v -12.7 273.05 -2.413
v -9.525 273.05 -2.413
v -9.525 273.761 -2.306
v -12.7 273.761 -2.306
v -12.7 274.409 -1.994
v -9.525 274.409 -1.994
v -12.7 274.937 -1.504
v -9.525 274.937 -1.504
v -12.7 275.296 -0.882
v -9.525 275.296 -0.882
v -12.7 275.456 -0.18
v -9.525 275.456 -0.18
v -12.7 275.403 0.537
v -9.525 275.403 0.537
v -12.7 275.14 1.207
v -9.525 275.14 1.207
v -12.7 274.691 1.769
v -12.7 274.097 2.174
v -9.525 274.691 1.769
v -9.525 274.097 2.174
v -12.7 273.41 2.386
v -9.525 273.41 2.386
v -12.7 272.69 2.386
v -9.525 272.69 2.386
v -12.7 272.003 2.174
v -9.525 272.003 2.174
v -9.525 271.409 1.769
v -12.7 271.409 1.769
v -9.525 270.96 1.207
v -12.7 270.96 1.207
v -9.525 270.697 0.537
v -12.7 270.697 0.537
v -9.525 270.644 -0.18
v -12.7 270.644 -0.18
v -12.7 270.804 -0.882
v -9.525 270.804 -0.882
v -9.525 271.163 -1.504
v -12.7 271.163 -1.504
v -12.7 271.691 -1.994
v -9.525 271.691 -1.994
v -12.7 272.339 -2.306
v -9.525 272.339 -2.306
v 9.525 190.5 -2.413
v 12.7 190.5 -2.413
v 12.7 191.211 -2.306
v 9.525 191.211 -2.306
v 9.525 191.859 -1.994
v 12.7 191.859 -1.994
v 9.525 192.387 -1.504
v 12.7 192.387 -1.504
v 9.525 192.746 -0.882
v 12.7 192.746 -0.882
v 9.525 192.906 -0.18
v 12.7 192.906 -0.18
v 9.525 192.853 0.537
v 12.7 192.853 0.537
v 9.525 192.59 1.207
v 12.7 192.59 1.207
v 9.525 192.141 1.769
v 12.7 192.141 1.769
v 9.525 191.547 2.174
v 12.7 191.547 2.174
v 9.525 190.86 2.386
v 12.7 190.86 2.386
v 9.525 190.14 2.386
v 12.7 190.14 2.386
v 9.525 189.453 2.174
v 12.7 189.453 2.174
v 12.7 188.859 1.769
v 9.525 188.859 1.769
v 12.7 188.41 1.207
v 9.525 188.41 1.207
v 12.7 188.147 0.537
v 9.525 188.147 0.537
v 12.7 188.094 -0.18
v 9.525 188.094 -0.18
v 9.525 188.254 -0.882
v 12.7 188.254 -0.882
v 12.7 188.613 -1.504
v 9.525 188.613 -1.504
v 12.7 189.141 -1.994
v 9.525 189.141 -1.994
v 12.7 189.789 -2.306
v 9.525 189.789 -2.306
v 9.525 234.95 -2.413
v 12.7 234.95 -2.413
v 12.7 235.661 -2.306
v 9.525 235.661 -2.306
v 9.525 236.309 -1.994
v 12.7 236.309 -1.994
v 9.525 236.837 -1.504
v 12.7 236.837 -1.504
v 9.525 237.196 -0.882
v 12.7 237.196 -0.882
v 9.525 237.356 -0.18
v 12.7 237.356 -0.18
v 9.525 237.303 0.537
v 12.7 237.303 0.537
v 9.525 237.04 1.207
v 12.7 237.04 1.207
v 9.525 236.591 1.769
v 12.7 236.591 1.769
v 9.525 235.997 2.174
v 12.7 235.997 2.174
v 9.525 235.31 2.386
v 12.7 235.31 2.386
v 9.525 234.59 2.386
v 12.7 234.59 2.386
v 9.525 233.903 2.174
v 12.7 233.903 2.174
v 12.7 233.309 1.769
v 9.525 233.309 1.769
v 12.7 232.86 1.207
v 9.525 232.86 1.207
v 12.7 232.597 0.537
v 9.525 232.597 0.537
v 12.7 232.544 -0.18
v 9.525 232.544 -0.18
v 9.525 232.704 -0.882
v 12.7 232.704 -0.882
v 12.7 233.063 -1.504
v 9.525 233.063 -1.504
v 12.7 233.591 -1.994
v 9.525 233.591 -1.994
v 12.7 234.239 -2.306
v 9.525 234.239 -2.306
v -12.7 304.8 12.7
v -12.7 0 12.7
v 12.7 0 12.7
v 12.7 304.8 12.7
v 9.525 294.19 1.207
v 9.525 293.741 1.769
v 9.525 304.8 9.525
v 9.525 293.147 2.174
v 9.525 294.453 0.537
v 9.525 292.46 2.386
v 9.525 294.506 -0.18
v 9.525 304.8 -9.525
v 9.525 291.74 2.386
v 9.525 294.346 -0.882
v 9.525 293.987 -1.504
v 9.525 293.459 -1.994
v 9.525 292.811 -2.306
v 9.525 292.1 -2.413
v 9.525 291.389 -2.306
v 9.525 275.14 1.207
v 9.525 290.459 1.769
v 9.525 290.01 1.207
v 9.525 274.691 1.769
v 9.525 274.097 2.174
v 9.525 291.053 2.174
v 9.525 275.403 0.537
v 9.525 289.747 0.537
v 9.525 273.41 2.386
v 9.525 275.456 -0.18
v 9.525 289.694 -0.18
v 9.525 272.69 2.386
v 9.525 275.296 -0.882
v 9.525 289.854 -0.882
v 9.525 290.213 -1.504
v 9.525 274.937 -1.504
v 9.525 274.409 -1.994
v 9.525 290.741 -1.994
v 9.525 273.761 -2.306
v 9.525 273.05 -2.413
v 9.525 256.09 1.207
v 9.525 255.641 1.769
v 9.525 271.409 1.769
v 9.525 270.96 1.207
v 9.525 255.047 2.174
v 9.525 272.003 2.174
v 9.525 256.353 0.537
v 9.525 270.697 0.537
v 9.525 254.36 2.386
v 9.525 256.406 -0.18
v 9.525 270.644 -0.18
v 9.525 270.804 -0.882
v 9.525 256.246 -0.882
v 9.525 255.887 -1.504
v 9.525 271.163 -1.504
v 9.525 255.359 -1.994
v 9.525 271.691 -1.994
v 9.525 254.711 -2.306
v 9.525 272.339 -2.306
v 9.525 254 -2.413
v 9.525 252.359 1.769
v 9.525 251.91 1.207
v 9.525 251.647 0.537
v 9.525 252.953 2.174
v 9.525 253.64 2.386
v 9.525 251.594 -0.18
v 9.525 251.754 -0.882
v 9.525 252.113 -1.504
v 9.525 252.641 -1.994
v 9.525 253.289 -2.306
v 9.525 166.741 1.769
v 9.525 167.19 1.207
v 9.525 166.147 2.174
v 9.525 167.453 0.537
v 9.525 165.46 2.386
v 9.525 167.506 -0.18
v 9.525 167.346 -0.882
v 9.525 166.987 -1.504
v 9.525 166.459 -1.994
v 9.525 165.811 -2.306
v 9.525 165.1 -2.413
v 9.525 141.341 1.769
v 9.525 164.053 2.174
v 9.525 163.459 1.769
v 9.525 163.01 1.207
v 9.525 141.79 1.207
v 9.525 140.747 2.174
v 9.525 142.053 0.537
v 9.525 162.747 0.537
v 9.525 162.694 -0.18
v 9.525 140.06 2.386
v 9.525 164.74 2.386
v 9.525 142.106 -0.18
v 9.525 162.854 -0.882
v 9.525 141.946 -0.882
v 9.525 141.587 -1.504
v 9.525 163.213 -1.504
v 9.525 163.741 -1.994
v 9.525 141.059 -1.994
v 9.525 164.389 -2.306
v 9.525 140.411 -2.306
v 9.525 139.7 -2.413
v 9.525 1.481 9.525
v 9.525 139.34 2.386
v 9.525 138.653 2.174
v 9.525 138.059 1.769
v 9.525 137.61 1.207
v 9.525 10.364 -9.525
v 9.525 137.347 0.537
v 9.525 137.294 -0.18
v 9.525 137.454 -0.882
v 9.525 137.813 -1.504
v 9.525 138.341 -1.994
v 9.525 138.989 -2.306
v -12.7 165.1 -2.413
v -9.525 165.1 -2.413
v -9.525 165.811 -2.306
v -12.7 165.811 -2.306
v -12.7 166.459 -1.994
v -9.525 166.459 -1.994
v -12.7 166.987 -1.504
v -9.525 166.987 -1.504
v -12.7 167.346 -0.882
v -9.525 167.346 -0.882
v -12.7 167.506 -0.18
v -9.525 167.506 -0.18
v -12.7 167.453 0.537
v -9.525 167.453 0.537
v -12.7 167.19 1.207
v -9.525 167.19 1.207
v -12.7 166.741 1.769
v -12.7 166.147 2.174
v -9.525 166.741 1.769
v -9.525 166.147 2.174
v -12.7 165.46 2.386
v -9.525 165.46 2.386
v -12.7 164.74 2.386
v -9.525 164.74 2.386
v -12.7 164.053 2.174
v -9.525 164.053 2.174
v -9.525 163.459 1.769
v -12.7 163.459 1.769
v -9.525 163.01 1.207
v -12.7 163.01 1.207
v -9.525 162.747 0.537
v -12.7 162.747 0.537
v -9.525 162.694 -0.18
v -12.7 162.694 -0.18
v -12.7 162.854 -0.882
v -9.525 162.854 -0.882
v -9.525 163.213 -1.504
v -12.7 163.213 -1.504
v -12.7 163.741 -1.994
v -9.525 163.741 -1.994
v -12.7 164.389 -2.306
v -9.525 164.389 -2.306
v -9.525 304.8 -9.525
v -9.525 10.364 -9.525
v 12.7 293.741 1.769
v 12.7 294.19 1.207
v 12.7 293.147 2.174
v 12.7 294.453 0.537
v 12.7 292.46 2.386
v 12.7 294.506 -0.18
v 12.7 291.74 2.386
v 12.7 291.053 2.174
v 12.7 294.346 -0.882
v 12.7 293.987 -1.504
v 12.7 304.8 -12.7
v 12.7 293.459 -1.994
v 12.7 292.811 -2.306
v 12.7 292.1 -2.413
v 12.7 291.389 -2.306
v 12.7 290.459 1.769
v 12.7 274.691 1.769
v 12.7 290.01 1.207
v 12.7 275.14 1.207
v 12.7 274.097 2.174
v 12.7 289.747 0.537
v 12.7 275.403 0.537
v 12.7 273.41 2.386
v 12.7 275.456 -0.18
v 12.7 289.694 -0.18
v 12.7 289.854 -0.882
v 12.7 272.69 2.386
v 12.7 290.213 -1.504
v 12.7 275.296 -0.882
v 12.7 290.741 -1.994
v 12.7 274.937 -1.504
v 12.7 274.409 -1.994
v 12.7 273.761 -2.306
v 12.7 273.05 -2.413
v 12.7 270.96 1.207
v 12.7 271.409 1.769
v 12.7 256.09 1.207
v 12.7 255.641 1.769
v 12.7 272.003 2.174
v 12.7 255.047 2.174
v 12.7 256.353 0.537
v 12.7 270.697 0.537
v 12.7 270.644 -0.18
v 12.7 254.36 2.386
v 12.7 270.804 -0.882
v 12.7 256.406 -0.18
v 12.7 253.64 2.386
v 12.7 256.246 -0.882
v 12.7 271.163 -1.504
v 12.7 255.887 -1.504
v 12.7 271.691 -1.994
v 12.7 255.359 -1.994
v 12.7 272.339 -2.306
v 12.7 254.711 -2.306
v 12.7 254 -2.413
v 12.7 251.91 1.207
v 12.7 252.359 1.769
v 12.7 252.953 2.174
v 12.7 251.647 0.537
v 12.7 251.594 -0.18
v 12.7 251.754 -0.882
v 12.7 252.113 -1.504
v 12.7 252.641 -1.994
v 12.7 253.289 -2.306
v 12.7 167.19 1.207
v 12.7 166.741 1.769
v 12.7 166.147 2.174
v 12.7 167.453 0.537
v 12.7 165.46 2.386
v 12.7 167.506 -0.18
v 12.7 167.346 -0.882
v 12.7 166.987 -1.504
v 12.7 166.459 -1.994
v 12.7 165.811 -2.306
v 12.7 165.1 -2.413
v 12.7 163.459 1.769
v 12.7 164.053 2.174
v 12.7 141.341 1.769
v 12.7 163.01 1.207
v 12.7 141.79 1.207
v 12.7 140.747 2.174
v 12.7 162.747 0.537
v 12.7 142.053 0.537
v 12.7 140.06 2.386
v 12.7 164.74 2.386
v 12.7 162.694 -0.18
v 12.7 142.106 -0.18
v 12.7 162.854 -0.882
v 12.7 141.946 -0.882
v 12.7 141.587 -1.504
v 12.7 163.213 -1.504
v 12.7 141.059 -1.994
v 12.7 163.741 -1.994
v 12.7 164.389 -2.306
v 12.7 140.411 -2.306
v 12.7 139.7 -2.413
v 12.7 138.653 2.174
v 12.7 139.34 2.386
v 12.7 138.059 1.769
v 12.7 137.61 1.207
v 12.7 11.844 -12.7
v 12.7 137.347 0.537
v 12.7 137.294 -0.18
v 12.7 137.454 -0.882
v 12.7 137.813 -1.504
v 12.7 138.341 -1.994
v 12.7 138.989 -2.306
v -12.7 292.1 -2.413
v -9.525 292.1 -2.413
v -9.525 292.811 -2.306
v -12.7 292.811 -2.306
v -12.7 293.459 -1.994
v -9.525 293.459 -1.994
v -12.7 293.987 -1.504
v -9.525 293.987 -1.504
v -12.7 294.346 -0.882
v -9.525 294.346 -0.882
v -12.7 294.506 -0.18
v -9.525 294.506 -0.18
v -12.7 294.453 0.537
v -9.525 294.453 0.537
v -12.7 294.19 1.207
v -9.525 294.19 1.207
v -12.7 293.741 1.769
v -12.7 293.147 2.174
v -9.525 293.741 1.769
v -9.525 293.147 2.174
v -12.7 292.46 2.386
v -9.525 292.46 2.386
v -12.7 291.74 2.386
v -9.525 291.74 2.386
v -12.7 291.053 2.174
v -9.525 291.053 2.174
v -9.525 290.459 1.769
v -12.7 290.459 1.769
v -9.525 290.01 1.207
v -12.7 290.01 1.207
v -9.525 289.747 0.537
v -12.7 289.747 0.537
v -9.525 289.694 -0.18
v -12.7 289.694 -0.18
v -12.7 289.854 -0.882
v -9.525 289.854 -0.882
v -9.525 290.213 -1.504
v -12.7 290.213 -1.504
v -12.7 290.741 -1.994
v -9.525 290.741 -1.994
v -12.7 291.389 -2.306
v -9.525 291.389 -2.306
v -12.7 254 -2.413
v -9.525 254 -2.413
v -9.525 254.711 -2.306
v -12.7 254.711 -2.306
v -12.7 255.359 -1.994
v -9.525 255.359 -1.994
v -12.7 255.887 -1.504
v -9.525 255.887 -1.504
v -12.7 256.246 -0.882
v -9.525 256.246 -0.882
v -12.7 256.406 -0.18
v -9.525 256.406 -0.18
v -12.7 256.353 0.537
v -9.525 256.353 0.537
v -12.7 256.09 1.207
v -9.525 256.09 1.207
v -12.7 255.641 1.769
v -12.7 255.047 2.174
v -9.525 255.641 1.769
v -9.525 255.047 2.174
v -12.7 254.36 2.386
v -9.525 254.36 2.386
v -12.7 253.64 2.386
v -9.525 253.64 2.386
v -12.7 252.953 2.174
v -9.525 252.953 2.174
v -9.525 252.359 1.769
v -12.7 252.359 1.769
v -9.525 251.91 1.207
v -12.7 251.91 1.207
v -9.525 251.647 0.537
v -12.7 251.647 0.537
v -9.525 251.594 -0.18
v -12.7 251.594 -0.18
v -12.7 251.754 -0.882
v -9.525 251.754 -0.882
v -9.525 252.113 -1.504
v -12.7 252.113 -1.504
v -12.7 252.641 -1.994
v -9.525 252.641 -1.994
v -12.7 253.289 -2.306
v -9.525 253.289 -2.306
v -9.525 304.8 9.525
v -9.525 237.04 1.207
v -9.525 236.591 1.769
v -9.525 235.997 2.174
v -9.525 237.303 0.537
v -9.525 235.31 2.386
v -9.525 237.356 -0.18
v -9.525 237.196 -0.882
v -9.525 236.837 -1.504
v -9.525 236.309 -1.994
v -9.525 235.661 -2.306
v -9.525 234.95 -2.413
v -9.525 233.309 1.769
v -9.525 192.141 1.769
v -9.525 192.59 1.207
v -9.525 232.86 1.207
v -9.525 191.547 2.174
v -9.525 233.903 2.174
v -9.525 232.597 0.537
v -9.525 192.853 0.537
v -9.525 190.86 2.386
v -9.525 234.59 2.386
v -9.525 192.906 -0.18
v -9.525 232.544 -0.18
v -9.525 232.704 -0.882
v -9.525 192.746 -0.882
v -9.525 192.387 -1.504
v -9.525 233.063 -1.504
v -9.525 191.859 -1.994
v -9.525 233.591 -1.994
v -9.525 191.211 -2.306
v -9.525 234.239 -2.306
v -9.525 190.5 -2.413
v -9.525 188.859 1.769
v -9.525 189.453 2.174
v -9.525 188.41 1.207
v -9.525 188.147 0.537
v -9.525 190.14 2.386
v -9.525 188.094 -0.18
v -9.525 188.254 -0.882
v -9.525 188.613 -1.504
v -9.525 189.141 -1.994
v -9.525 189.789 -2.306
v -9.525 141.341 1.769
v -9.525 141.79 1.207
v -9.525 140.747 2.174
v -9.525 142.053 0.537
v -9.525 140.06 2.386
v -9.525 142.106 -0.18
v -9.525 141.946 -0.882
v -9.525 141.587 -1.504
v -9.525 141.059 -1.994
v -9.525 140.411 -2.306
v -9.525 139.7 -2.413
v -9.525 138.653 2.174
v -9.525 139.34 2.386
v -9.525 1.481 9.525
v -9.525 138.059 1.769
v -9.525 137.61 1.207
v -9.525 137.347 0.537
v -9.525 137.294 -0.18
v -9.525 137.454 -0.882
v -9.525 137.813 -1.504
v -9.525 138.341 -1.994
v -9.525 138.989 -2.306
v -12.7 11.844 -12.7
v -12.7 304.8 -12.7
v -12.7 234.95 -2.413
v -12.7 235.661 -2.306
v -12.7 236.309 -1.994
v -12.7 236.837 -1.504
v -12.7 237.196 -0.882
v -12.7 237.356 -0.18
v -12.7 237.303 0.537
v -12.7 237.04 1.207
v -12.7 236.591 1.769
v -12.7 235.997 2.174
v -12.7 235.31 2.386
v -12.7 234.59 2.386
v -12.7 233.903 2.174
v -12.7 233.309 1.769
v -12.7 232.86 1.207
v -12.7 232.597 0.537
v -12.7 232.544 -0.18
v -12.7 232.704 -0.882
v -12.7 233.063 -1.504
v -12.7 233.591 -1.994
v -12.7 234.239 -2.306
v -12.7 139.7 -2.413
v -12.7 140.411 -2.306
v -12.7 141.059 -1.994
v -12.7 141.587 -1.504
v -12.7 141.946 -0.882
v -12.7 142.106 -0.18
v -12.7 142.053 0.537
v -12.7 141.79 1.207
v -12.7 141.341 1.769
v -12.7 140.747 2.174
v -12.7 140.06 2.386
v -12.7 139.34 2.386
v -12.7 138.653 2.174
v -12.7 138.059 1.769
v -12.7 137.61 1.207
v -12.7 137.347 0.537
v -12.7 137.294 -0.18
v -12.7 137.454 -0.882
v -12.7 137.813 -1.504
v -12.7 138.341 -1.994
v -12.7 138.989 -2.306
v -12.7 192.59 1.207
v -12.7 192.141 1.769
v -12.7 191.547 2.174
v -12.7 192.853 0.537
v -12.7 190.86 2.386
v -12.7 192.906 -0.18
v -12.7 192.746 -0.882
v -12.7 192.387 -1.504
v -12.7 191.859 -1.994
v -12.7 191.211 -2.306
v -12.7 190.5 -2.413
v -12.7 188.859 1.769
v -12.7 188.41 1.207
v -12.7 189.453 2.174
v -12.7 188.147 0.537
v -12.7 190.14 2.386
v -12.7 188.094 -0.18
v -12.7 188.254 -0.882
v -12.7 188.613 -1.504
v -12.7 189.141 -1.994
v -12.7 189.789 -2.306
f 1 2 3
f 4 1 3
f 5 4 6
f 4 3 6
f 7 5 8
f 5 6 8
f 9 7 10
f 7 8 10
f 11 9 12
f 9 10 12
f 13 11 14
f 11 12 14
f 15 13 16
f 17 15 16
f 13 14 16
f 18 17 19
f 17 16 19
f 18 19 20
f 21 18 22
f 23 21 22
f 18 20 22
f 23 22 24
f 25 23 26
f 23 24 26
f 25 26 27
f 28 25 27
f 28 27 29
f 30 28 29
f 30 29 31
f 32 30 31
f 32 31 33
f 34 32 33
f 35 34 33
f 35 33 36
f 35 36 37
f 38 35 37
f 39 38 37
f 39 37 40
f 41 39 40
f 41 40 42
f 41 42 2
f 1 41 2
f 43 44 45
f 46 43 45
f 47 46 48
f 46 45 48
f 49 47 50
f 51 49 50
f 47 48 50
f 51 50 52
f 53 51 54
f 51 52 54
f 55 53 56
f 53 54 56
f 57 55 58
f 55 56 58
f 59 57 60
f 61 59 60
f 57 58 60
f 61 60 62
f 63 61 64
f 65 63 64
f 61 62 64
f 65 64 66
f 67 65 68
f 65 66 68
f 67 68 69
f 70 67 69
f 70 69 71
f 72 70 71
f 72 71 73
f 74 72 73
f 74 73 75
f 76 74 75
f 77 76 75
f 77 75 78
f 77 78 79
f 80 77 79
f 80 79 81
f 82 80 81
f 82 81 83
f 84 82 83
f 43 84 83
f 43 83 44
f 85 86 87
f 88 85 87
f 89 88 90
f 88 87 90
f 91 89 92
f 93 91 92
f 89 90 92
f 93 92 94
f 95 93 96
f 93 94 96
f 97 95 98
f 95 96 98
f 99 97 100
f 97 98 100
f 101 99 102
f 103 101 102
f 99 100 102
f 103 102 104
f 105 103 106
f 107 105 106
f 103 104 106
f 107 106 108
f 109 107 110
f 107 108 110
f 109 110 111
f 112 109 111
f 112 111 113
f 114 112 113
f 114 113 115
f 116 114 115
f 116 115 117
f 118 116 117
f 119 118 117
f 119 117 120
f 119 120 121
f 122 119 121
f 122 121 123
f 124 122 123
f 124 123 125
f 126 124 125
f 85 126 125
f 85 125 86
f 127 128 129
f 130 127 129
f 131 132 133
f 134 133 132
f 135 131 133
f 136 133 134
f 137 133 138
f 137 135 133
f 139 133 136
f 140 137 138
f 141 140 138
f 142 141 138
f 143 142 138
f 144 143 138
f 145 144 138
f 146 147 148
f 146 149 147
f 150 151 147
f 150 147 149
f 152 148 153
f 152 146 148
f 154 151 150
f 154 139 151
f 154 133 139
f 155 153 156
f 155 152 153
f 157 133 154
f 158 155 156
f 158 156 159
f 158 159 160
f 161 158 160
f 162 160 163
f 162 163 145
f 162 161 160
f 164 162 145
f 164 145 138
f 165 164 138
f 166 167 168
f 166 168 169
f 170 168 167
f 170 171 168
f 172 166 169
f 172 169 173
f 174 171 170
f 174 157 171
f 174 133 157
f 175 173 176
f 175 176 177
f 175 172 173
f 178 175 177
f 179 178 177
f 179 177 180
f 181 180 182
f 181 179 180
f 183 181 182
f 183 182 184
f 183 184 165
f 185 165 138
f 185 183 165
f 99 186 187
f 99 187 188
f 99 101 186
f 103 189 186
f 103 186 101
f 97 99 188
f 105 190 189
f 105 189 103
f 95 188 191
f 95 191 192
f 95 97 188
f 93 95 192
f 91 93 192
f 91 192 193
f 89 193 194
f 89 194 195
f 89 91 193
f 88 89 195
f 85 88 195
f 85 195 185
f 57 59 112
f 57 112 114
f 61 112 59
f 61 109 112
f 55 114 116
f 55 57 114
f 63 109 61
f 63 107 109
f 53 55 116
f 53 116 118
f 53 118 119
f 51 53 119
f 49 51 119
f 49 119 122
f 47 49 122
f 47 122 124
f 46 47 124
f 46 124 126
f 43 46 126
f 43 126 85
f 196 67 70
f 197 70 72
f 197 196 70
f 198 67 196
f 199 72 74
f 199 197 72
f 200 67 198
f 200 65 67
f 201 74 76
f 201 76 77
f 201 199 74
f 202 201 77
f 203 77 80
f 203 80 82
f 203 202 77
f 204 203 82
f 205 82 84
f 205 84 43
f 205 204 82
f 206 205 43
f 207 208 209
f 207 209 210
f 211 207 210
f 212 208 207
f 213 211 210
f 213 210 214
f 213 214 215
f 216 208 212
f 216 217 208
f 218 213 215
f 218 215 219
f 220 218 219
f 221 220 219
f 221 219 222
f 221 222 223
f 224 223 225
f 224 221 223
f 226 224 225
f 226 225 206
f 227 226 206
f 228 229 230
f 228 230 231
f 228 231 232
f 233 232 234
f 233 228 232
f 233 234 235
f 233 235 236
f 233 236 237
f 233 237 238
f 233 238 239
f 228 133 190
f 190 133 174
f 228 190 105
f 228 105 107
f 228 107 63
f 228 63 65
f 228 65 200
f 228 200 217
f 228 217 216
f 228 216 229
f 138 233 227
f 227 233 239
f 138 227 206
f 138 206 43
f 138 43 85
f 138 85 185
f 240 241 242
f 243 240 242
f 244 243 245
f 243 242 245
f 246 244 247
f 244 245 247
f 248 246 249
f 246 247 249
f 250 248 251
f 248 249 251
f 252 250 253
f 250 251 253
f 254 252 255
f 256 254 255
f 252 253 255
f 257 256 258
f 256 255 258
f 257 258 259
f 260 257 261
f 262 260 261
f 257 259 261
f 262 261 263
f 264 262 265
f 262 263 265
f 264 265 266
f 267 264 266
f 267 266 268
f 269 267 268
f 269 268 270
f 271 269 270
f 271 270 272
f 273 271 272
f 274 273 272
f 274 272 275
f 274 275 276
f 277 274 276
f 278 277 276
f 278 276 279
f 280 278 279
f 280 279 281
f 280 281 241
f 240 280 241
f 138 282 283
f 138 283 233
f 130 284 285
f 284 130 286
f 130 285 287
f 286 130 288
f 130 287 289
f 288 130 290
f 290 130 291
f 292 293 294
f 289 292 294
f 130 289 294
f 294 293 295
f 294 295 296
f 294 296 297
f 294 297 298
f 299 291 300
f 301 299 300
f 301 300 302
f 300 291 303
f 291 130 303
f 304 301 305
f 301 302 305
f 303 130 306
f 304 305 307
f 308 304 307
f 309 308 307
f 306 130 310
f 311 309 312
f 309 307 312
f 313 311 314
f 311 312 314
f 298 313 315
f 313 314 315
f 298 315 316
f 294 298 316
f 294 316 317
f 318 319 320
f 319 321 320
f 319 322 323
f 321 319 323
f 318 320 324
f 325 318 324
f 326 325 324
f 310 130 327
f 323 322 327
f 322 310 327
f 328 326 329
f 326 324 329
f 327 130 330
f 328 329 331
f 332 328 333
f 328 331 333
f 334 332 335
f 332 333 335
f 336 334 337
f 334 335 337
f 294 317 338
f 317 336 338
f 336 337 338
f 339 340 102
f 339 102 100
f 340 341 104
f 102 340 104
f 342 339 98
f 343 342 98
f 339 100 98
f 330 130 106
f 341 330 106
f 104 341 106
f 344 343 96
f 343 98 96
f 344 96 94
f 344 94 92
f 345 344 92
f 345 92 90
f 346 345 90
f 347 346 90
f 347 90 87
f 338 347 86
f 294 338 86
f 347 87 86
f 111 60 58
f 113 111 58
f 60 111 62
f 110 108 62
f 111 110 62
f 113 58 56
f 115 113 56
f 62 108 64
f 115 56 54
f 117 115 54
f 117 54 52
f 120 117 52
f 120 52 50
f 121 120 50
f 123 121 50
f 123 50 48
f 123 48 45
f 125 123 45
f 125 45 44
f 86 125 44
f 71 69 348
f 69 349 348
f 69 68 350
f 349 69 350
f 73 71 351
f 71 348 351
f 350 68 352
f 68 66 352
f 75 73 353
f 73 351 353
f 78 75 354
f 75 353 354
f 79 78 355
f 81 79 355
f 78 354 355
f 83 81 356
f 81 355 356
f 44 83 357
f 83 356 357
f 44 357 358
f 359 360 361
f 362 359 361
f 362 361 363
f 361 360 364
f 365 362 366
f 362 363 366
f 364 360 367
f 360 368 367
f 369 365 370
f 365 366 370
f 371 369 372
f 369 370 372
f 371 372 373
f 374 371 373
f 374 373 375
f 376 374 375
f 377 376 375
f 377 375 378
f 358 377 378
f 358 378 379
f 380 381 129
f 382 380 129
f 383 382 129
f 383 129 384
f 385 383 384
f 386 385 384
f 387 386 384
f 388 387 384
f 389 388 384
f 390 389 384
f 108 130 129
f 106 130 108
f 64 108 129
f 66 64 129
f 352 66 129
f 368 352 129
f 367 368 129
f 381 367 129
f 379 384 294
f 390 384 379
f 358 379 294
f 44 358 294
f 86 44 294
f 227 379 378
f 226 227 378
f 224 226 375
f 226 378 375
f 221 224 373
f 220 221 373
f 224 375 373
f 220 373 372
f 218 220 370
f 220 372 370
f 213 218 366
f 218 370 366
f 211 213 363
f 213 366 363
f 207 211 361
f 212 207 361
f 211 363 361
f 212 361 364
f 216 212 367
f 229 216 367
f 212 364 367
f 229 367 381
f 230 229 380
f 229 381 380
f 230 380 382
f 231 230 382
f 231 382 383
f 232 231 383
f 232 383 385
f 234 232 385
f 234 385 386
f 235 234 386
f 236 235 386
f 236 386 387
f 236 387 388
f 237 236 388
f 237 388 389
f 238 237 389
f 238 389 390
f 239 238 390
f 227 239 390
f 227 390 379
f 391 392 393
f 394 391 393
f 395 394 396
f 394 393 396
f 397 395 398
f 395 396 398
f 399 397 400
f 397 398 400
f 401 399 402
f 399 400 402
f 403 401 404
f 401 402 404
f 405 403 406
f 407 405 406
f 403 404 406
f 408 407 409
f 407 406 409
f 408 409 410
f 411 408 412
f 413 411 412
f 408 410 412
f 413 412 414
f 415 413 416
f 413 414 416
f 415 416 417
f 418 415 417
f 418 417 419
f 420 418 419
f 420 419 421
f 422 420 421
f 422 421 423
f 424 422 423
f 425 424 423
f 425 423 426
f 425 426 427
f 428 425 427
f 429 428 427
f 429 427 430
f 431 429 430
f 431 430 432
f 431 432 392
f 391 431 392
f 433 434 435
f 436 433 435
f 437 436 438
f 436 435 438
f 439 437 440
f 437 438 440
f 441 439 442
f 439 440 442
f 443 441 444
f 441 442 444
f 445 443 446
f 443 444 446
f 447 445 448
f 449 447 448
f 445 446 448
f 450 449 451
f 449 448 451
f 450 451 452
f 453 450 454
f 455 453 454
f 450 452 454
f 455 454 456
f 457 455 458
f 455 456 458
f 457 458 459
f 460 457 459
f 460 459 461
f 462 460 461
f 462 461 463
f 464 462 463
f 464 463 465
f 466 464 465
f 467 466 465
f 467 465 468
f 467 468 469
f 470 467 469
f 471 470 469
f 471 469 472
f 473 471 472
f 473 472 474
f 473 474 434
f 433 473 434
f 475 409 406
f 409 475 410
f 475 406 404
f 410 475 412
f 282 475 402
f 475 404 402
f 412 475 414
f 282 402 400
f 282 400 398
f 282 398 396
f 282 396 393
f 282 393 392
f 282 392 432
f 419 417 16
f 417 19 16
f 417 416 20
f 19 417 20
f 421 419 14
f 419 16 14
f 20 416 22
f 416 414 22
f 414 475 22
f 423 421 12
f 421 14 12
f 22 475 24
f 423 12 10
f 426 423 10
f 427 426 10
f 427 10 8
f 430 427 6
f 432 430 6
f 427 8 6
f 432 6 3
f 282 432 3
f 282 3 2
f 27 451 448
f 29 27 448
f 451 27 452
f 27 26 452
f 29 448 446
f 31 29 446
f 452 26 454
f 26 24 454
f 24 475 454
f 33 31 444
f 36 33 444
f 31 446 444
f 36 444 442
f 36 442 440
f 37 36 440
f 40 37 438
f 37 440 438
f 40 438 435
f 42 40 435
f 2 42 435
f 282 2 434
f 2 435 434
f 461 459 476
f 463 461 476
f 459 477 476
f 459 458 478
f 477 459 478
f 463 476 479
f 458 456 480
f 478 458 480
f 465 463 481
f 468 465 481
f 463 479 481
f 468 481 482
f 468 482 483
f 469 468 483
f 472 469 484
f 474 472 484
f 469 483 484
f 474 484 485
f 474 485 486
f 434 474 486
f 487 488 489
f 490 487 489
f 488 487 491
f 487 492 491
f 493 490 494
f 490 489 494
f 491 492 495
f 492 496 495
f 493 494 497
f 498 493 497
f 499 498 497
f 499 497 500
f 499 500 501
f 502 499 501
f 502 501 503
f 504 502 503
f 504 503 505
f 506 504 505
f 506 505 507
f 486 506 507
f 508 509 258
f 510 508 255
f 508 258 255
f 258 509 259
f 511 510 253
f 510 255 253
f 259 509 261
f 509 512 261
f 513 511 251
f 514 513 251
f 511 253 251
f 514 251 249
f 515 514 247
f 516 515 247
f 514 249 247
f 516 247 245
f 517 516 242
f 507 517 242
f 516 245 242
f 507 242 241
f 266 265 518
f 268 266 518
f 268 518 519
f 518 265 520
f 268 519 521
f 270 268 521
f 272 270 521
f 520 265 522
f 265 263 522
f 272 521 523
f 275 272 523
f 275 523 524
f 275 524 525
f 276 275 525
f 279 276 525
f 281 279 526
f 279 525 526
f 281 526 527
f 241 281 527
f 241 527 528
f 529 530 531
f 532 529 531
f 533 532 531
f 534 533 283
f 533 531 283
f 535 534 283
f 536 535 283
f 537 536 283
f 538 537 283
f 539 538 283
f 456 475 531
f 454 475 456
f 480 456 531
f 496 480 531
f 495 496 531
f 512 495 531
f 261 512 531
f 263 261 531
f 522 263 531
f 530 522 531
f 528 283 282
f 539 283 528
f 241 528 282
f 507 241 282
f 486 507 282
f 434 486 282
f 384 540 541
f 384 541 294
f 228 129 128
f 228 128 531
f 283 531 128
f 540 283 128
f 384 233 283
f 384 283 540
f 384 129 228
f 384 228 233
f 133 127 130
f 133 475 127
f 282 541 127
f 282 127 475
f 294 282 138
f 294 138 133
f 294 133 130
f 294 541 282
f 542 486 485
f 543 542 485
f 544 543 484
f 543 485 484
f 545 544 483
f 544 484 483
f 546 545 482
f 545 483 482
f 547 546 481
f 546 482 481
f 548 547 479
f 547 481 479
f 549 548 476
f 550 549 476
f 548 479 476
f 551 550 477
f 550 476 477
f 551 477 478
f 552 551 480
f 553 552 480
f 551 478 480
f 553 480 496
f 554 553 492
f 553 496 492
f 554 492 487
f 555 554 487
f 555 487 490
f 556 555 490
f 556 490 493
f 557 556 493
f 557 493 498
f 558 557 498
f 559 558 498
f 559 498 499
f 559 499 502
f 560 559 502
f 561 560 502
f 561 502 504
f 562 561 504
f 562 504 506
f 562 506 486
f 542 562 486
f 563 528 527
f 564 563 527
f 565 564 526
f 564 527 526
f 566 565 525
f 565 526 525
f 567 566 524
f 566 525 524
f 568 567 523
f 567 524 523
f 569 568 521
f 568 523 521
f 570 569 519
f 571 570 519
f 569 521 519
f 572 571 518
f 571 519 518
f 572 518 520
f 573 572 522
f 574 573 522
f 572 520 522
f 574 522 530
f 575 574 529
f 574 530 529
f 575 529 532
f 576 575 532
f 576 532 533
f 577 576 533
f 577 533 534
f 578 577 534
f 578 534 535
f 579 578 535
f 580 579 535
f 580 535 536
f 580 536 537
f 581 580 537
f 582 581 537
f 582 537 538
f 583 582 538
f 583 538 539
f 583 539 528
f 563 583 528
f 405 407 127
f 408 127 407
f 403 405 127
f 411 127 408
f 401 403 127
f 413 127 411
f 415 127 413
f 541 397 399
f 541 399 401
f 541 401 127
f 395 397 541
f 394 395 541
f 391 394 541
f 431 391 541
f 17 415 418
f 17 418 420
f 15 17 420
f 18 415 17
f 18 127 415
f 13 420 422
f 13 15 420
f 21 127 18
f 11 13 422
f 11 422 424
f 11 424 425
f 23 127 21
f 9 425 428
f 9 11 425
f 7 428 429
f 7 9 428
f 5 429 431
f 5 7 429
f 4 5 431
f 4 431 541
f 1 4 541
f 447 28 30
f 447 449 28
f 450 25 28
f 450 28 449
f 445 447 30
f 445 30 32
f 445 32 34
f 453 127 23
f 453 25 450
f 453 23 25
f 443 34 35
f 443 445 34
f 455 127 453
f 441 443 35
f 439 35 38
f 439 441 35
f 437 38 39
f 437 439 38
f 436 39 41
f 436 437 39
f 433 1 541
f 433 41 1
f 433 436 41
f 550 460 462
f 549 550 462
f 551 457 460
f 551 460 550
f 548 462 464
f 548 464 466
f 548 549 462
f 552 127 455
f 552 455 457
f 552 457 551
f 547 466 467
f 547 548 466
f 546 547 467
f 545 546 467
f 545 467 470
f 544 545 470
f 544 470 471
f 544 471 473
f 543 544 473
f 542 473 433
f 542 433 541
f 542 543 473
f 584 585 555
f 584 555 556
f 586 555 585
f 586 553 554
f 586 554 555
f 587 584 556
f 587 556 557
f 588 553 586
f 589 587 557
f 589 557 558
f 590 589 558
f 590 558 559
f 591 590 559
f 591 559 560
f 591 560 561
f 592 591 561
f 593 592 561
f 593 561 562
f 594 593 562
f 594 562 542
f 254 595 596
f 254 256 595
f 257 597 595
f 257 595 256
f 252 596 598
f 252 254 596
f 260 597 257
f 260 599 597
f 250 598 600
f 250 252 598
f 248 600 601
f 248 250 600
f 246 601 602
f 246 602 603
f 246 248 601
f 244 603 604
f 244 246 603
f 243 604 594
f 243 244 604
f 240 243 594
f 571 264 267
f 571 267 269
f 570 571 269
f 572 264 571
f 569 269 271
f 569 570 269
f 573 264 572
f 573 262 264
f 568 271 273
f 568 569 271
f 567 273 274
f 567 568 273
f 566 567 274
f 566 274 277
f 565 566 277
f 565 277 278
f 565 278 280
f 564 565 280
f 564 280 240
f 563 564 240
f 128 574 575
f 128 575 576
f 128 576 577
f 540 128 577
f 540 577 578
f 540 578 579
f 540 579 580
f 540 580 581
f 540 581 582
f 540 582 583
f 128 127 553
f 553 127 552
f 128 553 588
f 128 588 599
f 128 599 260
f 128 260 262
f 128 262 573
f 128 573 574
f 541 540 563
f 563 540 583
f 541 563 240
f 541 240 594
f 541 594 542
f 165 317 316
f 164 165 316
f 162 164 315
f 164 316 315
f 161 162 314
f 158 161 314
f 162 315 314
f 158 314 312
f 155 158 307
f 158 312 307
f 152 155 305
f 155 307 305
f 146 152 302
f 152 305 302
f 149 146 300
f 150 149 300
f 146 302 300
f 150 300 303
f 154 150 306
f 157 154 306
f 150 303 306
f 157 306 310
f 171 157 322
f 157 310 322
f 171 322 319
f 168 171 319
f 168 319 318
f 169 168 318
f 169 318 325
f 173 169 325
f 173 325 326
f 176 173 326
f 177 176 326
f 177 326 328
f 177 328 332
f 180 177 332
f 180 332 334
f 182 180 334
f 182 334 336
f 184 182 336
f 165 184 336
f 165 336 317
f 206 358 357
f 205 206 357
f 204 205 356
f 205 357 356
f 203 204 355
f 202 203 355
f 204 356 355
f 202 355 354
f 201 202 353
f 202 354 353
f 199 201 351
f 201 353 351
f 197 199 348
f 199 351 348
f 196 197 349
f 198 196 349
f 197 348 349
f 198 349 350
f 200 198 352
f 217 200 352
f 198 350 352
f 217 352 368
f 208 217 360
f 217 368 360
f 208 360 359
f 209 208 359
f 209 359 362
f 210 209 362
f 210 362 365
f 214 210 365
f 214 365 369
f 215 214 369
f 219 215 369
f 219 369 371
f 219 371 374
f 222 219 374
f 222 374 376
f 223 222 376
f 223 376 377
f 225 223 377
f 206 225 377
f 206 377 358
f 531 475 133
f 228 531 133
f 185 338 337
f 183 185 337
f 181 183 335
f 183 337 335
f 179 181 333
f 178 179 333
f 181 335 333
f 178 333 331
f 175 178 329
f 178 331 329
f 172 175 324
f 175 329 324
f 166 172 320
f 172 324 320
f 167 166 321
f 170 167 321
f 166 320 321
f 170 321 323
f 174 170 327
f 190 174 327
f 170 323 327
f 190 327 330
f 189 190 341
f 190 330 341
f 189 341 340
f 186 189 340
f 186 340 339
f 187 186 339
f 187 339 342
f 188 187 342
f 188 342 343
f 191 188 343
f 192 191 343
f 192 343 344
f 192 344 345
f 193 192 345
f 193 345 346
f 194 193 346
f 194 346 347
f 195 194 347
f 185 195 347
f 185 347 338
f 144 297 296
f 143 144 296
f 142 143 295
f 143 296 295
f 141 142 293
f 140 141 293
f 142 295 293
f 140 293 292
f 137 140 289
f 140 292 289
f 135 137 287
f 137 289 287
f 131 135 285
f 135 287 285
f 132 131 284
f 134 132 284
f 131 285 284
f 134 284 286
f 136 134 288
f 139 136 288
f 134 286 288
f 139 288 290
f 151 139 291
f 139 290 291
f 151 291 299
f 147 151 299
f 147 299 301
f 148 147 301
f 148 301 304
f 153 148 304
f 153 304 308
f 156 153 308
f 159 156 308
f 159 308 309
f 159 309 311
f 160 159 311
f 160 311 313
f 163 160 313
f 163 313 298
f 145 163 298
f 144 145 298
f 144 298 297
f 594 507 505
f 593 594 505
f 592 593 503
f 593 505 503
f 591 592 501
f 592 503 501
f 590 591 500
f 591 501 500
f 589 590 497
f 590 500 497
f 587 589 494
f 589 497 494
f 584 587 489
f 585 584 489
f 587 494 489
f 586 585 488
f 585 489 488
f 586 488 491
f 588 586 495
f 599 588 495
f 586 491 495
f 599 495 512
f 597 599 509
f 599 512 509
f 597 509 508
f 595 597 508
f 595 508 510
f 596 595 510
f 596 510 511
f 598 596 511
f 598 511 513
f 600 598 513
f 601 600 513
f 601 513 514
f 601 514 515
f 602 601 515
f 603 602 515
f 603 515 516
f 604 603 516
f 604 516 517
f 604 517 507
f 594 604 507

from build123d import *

# Parameters (mm, degrees)
SKETCH1_W           = 25.4
SKETCH1_H           = 25.4
SKETCH1_W_2         = 19.05
SKETCH1_H_2         = 19.05
BOSS_EXTRUDE1_DEPTH = 304.8
SKETCH2_R           = 2.413
CUT_EXTRUDE1_DEPTH  = 25.4


with BuildPart() as part:
    # Sketch1 → Boss-Extrude1 (new body)
    with BuildSketch(Plane(origin=(0, 0, 0), x_dir=(1, 0, 0), z_dir=(0, 1, 0))):
        Rectangle(SKETCH1_W, SKETCH1_H)
        Rectangle(SKETCH1_W_2, SKETCH1_H_2, mode=Mode.SUBTRACT)
    extrude(amount=BOSS_EXTRUDE1_DEPTH)

    # Sketch2 → Cut-Extrude1 (cut)
    with BuildSketch(Plane(origin=(12.7, 0, 0), x_dir=(0, 0, -1), z_dir=(1, 0, 0))):
        with Locations((0, 292.1)):
            Circle(SKETCH2_R)
        with Locations((0, 273.05)):
            Circle(SKETCH2_R)
        with Locations((0, 254)):
            Circle(SKETCH2_R)
        with Locations((0, 234.95)):
            Circle(SKETCH2_R)
        with Locations((0, 190.5)):
            Circle(SKETCH2_R)
        with Locations((0, 165.1)):
            Circle(SKETCH2_R)
        with Locations((0, 139.7)):
            Circle(SKETCH2_R)
        Polygon((-12.7, 0), (12.7, 11.844214517), (12.7, 0), align=None)
    extrude(amount=-CUT_EXTRUDE1_DEPTH, mode=Mode.SUBTRACT)


solid = part.part
